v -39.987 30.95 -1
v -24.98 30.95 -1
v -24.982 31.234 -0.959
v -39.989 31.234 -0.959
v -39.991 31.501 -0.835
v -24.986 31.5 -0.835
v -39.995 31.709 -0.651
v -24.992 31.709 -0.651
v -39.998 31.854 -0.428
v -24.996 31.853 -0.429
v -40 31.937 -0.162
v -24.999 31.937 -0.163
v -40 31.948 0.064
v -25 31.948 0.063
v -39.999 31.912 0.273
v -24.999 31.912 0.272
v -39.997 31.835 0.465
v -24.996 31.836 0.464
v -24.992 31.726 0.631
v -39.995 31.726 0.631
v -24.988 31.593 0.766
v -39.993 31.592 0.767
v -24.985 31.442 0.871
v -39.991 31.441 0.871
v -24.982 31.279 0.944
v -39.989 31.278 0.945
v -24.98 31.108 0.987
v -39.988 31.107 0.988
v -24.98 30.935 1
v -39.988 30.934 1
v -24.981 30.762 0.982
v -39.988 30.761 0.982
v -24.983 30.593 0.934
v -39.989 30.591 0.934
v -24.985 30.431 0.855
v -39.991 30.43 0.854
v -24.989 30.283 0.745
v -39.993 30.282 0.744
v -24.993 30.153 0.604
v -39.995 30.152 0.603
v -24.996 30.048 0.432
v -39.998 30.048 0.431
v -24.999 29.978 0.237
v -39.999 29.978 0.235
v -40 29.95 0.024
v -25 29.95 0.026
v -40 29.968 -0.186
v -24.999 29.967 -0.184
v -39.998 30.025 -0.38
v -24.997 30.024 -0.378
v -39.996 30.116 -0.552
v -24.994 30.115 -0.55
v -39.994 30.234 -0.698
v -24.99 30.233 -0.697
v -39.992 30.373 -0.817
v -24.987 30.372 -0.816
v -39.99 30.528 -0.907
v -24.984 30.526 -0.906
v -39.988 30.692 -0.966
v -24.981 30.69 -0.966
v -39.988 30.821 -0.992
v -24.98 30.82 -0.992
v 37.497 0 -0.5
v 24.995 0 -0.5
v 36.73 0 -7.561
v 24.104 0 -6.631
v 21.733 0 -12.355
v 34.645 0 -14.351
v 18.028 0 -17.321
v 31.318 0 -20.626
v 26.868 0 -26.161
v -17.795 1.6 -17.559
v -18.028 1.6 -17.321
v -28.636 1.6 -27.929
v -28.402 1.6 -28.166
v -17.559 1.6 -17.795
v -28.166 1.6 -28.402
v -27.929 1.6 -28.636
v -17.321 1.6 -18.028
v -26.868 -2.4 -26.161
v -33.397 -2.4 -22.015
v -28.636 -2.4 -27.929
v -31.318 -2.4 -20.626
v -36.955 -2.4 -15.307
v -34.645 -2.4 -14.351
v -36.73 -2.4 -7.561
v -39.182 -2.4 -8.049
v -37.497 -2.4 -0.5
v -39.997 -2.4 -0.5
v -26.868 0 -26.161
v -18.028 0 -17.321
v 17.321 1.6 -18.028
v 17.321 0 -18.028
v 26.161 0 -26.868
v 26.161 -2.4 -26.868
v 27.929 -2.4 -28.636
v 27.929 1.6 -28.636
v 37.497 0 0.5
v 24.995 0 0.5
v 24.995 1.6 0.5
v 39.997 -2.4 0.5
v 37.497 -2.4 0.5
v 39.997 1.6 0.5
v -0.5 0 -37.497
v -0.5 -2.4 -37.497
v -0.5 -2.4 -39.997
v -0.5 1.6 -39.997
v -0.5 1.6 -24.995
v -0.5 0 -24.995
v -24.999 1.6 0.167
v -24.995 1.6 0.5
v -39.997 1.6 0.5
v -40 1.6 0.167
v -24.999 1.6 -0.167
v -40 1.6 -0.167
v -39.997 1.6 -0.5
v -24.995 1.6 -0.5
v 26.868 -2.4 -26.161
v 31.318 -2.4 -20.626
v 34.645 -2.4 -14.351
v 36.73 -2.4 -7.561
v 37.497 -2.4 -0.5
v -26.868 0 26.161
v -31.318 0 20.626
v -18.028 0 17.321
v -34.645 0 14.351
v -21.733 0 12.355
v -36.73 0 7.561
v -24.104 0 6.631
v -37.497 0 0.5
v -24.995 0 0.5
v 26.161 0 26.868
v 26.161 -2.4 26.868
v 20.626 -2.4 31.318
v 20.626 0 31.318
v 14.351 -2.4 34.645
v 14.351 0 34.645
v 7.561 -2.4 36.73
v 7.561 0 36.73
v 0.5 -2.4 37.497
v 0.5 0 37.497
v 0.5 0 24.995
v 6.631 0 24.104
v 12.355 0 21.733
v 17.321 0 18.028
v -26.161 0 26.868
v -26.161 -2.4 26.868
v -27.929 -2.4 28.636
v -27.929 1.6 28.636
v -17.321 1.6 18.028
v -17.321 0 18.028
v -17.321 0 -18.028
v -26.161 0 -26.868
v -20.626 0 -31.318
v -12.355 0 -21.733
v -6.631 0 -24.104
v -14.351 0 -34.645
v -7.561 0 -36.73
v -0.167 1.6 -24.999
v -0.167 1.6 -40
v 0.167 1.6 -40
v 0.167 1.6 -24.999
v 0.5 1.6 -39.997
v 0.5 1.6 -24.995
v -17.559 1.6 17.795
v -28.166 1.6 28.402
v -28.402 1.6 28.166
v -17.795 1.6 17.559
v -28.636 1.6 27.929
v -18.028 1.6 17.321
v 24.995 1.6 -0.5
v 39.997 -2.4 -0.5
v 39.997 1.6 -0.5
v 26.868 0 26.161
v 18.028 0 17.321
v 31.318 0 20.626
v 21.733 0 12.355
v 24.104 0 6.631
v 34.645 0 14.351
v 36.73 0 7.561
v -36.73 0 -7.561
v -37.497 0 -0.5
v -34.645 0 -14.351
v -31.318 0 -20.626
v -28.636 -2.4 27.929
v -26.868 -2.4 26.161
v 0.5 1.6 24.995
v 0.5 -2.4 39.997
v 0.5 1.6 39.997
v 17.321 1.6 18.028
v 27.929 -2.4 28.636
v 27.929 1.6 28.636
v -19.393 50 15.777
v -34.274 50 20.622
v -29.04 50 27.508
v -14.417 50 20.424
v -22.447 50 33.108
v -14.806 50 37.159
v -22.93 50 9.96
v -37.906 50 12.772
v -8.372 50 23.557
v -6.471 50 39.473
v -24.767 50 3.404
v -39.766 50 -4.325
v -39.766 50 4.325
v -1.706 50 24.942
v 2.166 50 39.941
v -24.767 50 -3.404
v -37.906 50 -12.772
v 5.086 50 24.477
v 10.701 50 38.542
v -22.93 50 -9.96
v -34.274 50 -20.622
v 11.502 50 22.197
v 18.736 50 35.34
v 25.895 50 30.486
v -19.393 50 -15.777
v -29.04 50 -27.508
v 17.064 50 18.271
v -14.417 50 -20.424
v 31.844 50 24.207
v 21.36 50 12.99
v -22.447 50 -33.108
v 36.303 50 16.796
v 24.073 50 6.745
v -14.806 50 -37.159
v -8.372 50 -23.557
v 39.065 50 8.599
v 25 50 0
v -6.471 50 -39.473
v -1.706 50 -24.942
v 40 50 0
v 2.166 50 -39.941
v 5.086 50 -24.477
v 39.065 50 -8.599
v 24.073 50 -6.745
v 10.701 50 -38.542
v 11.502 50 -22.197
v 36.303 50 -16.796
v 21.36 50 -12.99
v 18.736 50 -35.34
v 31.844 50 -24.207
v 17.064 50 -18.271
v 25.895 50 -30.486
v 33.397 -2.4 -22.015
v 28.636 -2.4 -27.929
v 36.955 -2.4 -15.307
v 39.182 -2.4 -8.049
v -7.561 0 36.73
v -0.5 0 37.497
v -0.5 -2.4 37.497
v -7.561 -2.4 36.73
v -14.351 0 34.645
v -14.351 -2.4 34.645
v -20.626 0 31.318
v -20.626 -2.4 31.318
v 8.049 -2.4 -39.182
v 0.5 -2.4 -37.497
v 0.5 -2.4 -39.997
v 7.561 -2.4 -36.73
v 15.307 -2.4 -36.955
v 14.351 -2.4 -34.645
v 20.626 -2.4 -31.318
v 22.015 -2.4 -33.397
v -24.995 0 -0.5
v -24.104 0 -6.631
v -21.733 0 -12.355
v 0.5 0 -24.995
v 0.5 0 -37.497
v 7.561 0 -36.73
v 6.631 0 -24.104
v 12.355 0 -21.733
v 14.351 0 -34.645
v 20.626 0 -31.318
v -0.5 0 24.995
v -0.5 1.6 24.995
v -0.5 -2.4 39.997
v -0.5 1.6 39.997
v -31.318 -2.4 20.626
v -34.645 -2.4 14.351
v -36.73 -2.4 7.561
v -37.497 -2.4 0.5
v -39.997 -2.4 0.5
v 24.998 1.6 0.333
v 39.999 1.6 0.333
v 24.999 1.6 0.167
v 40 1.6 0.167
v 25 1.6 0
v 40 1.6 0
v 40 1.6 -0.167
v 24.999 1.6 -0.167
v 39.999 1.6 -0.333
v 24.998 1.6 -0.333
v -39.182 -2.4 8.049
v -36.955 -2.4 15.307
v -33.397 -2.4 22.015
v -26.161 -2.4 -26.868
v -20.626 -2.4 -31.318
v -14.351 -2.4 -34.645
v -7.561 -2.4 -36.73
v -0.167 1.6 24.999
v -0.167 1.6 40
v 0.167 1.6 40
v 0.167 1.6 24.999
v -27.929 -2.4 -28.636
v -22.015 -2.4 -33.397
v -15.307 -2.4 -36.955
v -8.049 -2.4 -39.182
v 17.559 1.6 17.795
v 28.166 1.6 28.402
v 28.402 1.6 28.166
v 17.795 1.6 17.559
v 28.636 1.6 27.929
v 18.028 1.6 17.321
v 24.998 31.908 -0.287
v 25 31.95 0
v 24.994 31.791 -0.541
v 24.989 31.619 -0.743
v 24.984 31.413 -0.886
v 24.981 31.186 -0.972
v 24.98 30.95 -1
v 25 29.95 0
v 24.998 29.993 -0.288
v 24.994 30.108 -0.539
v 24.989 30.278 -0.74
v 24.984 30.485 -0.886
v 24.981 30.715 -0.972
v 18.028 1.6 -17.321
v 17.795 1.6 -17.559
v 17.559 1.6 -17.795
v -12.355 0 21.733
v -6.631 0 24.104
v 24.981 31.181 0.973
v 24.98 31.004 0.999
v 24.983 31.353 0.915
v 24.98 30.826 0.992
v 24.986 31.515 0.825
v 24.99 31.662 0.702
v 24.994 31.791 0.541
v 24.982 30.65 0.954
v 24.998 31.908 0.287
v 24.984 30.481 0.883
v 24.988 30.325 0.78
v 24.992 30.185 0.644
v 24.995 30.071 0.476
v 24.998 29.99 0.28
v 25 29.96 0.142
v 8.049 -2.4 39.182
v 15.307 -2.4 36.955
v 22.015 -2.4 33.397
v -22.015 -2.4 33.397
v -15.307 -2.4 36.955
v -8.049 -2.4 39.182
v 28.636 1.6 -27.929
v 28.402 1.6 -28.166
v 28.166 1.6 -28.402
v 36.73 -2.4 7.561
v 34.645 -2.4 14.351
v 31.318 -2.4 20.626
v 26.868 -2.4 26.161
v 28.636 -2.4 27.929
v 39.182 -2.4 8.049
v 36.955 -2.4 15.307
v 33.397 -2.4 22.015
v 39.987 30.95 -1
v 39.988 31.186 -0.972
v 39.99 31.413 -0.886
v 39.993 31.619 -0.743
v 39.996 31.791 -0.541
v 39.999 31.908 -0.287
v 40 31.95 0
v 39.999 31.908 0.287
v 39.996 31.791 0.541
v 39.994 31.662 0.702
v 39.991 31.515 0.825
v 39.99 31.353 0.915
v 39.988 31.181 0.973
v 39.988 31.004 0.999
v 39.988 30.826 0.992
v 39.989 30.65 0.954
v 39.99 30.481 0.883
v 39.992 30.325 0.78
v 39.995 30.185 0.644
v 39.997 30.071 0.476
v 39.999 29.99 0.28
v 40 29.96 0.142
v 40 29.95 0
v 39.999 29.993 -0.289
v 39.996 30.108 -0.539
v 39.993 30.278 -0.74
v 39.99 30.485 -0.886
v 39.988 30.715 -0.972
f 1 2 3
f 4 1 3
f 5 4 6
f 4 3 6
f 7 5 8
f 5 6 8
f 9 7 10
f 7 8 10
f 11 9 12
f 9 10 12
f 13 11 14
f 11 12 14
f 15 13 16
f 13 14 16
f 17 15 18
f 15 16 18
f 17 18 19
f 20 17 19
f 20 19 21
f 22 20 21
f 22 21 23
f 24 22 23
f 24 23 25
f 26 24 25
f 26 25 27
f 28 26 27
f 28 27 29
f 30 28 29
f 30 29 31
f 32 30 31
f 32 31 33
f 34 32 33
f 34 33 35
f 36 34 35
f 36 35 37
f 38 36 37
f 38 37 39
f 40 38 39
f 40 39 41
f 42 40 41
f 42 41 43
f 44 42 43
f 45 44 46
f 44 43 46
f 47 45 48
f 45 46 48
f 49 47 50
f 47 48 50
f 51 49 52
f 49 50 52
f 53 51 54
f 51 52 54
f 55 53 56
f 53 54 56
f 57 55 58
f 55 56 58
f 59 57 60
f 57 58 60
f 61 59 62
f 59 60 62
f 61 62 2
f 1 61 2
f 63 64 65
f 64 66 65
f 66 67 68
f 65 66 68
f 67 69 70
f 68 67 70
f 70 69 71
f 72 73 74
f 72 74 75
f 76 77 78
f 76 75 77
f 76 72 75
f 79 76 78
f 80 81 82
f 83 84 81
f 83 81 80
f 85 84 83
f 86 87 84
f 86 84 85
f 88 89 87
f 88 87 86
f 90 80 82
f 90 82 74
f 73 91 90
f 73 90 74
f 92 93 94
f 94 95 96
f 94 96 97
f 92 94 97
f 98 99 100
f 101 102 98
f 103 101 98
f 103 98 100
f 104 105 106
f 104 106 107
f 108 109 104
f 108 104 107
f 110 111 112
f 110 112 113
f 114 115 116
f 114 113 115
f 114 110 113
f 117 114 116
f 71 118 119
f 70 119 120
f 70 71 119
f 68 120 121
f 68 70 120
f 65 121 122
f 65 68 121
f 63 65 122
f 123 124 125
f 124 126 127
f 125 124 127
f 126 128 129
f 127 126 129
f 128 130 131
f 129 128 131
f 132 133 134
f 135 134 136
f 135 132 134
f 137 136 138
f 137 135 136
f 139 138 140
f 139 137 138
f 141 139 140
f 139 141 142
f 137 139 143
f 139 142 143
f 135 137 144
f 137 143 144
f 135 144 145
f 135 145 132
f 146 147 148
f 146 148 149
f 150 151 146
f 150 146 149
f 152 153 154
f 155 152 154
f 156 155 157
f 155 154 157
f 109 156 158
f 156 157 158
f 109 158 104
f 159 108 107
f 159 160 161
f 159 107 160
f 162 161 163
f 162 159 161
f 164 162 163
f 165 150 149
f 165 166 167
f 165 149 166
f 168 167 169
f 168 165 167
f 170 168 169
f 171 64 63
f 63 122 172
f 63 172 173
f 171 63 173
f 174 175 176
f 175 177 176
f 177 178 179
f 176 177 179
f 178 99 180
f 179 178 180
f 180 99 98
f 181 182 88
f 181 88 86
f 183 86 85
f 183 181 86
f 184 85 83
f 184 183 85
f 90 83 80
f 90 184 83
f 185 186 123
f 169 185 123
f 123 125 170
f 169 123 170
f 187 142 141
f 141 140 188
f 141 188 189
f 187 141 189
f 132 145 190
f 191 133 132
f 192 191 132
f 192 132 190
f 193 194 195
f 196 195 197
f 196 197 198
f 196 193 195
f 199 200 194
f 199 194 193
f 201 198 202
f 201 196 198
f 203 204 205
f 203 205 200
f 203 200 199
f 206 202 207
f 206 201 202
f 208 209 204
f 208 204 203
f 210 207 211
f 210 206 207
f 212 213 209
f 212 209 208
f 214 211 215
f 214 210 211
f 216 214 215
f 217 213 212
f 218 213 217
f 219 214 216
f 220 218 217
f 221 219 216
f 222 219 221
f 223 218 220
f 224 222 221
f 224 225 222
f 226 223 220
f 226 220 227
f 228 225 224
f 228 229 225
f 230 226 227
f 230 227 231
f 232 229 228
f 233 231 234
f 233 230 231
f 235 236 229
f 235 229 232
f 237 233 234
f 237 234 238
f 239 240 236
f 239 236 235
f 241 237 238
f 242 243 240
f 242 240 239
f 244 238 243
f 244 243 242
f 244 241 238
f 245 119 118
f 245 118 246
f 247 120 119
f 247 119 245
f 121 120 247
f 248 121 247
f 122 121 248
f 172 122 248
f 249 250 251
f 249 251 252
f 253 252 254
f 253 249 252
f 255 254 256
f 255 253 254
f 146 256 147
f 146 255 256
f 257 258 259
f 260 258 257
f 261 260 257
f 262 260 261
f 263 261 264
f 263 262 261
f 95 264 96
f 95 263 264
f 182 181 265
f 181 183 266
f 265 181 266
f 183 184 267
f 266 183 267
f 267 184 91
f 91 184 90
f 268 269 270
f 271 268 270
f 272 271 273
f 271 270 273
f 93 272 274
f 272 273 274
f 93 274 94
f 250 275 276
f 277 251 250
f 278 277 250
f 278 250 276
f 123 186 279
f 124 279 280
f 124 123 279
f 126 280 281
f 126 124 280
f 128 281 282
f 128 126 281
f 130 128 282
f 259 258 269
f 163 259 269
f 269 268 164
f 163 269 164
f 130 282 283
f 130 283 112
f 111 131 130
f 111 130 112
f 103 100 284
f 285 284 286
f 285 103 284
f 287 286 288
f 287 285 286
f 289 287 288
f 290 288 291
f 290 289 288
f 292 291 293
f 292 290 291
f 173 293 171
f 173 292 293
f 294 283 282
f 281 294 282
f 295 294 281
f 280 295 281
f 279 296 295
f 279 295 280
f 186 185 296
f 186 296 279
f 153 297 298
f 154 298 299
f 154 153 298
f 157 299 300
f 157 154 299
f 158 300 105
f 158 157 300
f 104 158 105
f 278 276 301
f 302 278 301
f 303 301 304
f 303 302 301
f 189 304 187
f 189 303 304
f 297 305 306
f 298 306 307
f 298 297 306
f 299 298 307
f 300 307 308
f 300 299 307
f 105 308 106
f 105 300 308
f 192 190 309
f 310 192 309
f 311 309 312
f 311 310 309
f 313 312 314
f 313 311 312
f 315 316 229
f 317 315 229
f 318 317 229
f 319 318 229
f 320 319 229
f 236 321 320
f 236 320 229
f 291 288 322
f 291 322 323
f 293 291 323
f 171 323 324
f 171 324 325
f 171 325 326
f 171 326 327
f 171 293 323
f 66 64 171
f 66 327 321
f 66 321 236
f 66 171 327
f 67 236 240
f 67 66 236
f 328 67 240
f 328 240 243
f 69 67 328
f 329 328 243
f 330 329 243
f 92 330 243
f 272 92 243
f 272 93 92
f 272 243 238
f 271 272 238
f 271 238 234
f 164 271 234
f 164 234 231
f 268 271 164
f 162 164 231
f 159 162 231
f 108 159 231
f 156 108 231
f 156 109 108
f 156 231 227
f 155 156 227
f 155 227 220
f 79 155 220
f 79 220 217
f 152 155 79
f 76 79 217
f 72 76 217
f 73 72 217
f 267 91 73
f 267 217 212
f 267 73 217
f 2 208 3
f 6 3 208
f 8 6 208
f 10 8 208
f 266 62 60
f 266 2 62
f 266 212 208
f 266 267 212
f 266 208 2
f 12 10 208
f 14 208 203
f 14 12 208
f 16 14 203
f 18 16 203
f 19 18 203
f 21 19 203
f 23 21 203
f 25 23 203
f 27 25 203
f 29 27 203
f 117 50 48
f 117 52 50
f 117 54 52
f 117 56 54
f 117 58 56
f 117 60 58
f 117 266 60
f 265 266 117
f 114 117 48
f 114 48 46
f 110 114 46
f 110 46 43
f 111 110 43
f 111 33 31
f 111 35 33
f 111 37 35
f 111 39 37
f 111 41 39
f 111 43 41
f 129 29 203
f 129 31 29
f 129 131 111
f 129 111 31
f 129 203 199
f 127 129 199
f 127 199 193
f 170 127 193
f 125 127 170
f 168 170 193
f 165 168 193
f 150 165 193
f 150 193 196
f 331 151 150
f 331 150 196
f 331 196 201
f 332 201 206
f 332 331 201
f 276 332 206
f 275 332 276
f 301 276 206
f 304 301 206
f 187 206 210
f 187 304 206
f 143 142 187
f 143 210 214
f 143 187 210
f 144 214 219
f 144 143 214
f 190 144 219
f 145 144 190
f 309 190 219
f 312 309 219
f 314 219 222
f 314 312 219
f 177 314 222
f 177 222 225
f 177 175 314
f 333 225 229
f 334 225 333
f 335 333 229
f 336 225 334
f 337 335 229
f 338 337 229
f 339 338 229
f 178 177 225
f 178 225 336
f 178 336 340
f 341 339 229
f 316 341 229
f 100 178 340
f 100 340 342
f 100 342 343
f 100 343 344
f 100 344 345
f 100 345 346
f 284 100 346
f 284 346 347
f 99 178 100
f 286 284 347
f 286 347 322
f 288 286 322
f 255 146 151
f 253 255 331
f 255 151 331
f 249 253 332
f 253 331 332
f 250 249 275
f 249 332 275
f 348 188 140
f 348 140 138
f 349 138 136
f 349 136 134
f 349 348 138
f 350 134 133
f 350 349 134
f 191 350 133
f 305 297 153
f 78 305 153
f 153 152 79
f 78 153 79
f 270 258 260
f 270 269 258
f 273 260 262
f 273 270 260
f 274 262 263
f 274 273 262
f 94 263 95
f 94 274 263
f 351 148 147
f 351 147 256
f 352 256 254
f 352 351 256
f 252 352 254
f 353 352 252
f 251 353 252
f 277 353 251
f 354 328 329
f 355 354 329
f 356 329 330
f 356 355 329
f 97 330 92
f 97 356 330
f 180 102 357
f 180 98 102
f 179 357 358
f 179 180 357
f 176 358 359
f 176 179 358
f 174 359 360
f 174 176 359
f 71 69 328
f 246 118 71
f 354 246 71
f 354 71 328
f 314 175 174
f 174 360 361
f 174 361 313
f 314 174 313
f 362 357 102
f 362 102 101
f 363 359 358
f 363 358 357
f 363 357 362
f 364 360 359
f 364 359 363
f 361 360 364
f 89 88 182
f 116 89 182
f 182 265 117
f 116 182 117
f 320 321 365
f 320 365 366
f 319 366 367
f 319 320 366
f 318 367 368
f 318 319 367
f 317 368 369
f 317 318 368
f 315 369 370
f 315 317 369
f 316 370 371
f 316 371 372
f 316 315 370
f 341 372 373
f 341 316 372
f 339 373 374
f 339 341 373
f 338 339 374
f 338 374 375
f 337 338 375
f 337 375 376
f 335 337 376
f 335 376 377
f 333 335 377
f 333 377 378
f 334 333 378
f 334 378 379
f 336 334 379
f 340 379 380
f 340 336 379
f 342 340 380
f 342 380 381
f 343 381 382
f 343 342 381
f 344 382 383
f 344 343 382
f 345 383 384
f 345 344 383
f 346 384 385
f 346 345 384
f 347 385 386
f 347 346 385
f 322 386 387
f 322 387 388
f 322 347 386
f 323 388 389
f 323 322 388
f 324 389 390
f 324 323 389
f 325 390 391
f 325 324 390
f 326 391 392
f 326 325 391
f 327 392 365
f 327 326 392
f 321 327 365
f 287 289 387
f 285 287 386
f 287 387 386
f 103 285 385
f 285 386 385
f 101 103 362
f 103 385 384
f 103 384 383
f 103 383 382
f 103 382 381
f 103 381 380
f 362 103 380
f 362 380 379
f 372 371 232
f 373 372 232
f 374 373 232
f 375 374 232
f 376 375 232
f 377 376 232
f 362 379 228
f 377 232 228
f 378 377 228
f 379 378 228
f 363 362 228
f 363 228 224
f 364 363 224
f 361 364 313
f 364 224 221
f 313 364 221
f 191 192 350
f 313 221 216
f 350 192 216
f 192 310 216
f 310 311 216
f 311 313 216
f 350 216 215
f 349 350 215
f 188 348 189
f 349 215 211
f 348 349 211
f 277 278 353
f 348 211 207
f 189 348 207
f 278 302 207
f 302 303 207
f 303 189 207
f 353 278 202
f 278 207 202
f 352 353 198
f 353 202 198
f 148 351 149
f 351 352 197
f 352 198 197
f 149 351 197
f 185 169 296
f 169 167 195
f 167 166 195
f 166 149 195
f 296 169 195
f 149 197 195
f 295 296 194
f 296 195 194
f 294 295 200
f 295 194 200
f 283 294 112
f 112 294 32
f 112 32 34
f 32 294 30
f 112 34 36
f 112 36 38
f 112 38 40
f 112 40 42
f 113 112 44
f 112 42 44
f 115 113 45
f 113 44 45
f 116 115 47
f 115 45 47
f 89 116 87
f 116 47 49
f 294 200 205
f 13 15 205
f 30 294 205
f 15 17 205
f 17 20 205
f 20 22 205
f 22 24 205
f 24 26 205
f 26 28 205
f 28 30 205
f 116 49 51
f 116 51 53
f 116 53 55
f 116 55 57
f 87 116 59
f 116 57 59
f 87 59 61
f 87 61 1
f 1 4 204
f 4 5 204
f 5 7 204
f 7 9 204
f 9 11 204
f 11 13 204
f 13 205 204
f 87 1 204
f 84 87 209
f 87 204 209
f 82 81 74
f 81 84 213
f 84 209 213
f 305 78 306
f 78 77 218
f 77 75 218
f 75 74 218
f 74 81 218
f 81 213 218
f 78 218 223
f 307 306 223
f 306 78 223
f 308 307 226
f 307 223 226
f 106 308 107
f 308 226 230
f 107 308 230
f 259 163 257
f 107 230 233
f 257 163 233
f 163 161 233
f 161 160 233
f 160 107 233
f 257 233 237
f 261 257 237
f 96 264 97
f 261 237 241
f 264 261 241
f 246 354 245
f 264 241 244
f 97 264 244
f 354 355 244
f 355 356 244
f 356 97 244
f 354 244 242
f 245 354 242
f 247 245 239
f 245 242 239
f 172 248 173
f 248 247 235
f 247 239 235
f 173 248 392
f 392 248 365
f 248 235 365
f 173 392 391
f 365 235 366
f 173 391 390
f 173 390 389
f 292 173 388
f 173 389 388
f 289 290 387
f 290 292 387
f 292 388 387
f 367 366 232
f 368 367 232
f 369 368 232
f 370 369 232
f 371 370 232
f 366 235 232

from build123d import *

# Parameters (mm, degrees)
SKETCH1_R               = 40
SKETCH1_R_2             = 25
BOSS_EXTRUDE1_DEPTH     = 50
SKETCH2_R               = 40
SKETCH2_R_2             = 37.5
BOSS_EXTRUDE2_DEPTH     = 5
SKETCH3_R               = 1
CUT_EXTRUDE2_DEPTH      = 41
CUT_EXTRUDE2_DEPTH_BACK = 41
SKETCH4_W               = 1
SKETCH4_H               = 6.6
CUT_EXTRUDE3_DEPTH      = 41.0000001
CIRPATTERN1_COUNT       = 4
CIRPATTERN1_ANGLE       = 135
SKETCH5_R               = 61.08994387
CUT_EXTRUDE4_DEPTH      = 2.6


with BuildPart() as part:
    # Sketch1 → Boss-Extrude1 (new body)
    with BuildSketch(Plane(origin=(0, 0, 0), x_dir=(1, 0, 0), z_dir=(0, 1, 0))):
        Circle(SKETCH1_R)
        Circle(SKETCH1_R_2, mode=Mode.SUBTRACT)
    extrude(amount=BOSS_EXTRUDE1_DEPTH)

    # Sketch2 → Boss-Extrude2 (add)
    with BuildSketch(Plane.XZ):
        Circle(SKETCH2_R)
        Circle(SKETCH2_R_2, mode=Mode.SUBTRACT)
    extrude(amount=BOSS_EXTRUDE2_DEPTH)

    # Sketch3 → Cut-Extrude2 (cut, two sides)
    with BuildSketch(Plane(origin=(0, 0, 0), x_dir=(0, 0, -1), z_dir=(1, 0, 0))) as cut_extrude2_sk:
        with Locations((0, 30.95)):
            Circle(SKETCH3_R)
    extrude(amount=CUT_EXTRUDE2_DEPTH, mode=Mode.SUBTRACT)
    extrude(cut_extrude2_sk.sketch, amount=-CUT_EXTRUDE2_DEPTH_BACK, mode=Mode.SUBTRACT)

    # Sketch4 → Cut-Extrude3 (cut, symmetric)
    with BuildSketch(Plane.XY):
        with Locations((0, -1.7)):
            Rectangle(SKETCH4_W, SKETCH4_H)
    cut_extrude3 = extrude(amount=CUT_EXTRUDE3_DEPTH, both=True, mode=Mode.SUBTRACT)

    # CirPattern1: Cut-Extrude3 ×4 about axis
    cirpattern1_axis = Axis((0, 0, 0), (0, 1, 0))
    for i in range(1, CIRPATTERN1_COUNT):
        add(cut_extrude3.rotate(cirpattern1_axis, i * CIRPATTERN1_ANGLE / (CIRPATTERN1_COUNT - 1)), mode=Mode.SUBTRACT)

    # Sketch5 → Cut-Extrude4 (cut)
    with BuildSketch(Plane.XZ.offset(5)):
        Circle(SKETCH5_R)
    extrude(amount=-CUT_EXTRUDE4_DEPTH, mode=Mode.SUBTRACT)


solid = part.part
